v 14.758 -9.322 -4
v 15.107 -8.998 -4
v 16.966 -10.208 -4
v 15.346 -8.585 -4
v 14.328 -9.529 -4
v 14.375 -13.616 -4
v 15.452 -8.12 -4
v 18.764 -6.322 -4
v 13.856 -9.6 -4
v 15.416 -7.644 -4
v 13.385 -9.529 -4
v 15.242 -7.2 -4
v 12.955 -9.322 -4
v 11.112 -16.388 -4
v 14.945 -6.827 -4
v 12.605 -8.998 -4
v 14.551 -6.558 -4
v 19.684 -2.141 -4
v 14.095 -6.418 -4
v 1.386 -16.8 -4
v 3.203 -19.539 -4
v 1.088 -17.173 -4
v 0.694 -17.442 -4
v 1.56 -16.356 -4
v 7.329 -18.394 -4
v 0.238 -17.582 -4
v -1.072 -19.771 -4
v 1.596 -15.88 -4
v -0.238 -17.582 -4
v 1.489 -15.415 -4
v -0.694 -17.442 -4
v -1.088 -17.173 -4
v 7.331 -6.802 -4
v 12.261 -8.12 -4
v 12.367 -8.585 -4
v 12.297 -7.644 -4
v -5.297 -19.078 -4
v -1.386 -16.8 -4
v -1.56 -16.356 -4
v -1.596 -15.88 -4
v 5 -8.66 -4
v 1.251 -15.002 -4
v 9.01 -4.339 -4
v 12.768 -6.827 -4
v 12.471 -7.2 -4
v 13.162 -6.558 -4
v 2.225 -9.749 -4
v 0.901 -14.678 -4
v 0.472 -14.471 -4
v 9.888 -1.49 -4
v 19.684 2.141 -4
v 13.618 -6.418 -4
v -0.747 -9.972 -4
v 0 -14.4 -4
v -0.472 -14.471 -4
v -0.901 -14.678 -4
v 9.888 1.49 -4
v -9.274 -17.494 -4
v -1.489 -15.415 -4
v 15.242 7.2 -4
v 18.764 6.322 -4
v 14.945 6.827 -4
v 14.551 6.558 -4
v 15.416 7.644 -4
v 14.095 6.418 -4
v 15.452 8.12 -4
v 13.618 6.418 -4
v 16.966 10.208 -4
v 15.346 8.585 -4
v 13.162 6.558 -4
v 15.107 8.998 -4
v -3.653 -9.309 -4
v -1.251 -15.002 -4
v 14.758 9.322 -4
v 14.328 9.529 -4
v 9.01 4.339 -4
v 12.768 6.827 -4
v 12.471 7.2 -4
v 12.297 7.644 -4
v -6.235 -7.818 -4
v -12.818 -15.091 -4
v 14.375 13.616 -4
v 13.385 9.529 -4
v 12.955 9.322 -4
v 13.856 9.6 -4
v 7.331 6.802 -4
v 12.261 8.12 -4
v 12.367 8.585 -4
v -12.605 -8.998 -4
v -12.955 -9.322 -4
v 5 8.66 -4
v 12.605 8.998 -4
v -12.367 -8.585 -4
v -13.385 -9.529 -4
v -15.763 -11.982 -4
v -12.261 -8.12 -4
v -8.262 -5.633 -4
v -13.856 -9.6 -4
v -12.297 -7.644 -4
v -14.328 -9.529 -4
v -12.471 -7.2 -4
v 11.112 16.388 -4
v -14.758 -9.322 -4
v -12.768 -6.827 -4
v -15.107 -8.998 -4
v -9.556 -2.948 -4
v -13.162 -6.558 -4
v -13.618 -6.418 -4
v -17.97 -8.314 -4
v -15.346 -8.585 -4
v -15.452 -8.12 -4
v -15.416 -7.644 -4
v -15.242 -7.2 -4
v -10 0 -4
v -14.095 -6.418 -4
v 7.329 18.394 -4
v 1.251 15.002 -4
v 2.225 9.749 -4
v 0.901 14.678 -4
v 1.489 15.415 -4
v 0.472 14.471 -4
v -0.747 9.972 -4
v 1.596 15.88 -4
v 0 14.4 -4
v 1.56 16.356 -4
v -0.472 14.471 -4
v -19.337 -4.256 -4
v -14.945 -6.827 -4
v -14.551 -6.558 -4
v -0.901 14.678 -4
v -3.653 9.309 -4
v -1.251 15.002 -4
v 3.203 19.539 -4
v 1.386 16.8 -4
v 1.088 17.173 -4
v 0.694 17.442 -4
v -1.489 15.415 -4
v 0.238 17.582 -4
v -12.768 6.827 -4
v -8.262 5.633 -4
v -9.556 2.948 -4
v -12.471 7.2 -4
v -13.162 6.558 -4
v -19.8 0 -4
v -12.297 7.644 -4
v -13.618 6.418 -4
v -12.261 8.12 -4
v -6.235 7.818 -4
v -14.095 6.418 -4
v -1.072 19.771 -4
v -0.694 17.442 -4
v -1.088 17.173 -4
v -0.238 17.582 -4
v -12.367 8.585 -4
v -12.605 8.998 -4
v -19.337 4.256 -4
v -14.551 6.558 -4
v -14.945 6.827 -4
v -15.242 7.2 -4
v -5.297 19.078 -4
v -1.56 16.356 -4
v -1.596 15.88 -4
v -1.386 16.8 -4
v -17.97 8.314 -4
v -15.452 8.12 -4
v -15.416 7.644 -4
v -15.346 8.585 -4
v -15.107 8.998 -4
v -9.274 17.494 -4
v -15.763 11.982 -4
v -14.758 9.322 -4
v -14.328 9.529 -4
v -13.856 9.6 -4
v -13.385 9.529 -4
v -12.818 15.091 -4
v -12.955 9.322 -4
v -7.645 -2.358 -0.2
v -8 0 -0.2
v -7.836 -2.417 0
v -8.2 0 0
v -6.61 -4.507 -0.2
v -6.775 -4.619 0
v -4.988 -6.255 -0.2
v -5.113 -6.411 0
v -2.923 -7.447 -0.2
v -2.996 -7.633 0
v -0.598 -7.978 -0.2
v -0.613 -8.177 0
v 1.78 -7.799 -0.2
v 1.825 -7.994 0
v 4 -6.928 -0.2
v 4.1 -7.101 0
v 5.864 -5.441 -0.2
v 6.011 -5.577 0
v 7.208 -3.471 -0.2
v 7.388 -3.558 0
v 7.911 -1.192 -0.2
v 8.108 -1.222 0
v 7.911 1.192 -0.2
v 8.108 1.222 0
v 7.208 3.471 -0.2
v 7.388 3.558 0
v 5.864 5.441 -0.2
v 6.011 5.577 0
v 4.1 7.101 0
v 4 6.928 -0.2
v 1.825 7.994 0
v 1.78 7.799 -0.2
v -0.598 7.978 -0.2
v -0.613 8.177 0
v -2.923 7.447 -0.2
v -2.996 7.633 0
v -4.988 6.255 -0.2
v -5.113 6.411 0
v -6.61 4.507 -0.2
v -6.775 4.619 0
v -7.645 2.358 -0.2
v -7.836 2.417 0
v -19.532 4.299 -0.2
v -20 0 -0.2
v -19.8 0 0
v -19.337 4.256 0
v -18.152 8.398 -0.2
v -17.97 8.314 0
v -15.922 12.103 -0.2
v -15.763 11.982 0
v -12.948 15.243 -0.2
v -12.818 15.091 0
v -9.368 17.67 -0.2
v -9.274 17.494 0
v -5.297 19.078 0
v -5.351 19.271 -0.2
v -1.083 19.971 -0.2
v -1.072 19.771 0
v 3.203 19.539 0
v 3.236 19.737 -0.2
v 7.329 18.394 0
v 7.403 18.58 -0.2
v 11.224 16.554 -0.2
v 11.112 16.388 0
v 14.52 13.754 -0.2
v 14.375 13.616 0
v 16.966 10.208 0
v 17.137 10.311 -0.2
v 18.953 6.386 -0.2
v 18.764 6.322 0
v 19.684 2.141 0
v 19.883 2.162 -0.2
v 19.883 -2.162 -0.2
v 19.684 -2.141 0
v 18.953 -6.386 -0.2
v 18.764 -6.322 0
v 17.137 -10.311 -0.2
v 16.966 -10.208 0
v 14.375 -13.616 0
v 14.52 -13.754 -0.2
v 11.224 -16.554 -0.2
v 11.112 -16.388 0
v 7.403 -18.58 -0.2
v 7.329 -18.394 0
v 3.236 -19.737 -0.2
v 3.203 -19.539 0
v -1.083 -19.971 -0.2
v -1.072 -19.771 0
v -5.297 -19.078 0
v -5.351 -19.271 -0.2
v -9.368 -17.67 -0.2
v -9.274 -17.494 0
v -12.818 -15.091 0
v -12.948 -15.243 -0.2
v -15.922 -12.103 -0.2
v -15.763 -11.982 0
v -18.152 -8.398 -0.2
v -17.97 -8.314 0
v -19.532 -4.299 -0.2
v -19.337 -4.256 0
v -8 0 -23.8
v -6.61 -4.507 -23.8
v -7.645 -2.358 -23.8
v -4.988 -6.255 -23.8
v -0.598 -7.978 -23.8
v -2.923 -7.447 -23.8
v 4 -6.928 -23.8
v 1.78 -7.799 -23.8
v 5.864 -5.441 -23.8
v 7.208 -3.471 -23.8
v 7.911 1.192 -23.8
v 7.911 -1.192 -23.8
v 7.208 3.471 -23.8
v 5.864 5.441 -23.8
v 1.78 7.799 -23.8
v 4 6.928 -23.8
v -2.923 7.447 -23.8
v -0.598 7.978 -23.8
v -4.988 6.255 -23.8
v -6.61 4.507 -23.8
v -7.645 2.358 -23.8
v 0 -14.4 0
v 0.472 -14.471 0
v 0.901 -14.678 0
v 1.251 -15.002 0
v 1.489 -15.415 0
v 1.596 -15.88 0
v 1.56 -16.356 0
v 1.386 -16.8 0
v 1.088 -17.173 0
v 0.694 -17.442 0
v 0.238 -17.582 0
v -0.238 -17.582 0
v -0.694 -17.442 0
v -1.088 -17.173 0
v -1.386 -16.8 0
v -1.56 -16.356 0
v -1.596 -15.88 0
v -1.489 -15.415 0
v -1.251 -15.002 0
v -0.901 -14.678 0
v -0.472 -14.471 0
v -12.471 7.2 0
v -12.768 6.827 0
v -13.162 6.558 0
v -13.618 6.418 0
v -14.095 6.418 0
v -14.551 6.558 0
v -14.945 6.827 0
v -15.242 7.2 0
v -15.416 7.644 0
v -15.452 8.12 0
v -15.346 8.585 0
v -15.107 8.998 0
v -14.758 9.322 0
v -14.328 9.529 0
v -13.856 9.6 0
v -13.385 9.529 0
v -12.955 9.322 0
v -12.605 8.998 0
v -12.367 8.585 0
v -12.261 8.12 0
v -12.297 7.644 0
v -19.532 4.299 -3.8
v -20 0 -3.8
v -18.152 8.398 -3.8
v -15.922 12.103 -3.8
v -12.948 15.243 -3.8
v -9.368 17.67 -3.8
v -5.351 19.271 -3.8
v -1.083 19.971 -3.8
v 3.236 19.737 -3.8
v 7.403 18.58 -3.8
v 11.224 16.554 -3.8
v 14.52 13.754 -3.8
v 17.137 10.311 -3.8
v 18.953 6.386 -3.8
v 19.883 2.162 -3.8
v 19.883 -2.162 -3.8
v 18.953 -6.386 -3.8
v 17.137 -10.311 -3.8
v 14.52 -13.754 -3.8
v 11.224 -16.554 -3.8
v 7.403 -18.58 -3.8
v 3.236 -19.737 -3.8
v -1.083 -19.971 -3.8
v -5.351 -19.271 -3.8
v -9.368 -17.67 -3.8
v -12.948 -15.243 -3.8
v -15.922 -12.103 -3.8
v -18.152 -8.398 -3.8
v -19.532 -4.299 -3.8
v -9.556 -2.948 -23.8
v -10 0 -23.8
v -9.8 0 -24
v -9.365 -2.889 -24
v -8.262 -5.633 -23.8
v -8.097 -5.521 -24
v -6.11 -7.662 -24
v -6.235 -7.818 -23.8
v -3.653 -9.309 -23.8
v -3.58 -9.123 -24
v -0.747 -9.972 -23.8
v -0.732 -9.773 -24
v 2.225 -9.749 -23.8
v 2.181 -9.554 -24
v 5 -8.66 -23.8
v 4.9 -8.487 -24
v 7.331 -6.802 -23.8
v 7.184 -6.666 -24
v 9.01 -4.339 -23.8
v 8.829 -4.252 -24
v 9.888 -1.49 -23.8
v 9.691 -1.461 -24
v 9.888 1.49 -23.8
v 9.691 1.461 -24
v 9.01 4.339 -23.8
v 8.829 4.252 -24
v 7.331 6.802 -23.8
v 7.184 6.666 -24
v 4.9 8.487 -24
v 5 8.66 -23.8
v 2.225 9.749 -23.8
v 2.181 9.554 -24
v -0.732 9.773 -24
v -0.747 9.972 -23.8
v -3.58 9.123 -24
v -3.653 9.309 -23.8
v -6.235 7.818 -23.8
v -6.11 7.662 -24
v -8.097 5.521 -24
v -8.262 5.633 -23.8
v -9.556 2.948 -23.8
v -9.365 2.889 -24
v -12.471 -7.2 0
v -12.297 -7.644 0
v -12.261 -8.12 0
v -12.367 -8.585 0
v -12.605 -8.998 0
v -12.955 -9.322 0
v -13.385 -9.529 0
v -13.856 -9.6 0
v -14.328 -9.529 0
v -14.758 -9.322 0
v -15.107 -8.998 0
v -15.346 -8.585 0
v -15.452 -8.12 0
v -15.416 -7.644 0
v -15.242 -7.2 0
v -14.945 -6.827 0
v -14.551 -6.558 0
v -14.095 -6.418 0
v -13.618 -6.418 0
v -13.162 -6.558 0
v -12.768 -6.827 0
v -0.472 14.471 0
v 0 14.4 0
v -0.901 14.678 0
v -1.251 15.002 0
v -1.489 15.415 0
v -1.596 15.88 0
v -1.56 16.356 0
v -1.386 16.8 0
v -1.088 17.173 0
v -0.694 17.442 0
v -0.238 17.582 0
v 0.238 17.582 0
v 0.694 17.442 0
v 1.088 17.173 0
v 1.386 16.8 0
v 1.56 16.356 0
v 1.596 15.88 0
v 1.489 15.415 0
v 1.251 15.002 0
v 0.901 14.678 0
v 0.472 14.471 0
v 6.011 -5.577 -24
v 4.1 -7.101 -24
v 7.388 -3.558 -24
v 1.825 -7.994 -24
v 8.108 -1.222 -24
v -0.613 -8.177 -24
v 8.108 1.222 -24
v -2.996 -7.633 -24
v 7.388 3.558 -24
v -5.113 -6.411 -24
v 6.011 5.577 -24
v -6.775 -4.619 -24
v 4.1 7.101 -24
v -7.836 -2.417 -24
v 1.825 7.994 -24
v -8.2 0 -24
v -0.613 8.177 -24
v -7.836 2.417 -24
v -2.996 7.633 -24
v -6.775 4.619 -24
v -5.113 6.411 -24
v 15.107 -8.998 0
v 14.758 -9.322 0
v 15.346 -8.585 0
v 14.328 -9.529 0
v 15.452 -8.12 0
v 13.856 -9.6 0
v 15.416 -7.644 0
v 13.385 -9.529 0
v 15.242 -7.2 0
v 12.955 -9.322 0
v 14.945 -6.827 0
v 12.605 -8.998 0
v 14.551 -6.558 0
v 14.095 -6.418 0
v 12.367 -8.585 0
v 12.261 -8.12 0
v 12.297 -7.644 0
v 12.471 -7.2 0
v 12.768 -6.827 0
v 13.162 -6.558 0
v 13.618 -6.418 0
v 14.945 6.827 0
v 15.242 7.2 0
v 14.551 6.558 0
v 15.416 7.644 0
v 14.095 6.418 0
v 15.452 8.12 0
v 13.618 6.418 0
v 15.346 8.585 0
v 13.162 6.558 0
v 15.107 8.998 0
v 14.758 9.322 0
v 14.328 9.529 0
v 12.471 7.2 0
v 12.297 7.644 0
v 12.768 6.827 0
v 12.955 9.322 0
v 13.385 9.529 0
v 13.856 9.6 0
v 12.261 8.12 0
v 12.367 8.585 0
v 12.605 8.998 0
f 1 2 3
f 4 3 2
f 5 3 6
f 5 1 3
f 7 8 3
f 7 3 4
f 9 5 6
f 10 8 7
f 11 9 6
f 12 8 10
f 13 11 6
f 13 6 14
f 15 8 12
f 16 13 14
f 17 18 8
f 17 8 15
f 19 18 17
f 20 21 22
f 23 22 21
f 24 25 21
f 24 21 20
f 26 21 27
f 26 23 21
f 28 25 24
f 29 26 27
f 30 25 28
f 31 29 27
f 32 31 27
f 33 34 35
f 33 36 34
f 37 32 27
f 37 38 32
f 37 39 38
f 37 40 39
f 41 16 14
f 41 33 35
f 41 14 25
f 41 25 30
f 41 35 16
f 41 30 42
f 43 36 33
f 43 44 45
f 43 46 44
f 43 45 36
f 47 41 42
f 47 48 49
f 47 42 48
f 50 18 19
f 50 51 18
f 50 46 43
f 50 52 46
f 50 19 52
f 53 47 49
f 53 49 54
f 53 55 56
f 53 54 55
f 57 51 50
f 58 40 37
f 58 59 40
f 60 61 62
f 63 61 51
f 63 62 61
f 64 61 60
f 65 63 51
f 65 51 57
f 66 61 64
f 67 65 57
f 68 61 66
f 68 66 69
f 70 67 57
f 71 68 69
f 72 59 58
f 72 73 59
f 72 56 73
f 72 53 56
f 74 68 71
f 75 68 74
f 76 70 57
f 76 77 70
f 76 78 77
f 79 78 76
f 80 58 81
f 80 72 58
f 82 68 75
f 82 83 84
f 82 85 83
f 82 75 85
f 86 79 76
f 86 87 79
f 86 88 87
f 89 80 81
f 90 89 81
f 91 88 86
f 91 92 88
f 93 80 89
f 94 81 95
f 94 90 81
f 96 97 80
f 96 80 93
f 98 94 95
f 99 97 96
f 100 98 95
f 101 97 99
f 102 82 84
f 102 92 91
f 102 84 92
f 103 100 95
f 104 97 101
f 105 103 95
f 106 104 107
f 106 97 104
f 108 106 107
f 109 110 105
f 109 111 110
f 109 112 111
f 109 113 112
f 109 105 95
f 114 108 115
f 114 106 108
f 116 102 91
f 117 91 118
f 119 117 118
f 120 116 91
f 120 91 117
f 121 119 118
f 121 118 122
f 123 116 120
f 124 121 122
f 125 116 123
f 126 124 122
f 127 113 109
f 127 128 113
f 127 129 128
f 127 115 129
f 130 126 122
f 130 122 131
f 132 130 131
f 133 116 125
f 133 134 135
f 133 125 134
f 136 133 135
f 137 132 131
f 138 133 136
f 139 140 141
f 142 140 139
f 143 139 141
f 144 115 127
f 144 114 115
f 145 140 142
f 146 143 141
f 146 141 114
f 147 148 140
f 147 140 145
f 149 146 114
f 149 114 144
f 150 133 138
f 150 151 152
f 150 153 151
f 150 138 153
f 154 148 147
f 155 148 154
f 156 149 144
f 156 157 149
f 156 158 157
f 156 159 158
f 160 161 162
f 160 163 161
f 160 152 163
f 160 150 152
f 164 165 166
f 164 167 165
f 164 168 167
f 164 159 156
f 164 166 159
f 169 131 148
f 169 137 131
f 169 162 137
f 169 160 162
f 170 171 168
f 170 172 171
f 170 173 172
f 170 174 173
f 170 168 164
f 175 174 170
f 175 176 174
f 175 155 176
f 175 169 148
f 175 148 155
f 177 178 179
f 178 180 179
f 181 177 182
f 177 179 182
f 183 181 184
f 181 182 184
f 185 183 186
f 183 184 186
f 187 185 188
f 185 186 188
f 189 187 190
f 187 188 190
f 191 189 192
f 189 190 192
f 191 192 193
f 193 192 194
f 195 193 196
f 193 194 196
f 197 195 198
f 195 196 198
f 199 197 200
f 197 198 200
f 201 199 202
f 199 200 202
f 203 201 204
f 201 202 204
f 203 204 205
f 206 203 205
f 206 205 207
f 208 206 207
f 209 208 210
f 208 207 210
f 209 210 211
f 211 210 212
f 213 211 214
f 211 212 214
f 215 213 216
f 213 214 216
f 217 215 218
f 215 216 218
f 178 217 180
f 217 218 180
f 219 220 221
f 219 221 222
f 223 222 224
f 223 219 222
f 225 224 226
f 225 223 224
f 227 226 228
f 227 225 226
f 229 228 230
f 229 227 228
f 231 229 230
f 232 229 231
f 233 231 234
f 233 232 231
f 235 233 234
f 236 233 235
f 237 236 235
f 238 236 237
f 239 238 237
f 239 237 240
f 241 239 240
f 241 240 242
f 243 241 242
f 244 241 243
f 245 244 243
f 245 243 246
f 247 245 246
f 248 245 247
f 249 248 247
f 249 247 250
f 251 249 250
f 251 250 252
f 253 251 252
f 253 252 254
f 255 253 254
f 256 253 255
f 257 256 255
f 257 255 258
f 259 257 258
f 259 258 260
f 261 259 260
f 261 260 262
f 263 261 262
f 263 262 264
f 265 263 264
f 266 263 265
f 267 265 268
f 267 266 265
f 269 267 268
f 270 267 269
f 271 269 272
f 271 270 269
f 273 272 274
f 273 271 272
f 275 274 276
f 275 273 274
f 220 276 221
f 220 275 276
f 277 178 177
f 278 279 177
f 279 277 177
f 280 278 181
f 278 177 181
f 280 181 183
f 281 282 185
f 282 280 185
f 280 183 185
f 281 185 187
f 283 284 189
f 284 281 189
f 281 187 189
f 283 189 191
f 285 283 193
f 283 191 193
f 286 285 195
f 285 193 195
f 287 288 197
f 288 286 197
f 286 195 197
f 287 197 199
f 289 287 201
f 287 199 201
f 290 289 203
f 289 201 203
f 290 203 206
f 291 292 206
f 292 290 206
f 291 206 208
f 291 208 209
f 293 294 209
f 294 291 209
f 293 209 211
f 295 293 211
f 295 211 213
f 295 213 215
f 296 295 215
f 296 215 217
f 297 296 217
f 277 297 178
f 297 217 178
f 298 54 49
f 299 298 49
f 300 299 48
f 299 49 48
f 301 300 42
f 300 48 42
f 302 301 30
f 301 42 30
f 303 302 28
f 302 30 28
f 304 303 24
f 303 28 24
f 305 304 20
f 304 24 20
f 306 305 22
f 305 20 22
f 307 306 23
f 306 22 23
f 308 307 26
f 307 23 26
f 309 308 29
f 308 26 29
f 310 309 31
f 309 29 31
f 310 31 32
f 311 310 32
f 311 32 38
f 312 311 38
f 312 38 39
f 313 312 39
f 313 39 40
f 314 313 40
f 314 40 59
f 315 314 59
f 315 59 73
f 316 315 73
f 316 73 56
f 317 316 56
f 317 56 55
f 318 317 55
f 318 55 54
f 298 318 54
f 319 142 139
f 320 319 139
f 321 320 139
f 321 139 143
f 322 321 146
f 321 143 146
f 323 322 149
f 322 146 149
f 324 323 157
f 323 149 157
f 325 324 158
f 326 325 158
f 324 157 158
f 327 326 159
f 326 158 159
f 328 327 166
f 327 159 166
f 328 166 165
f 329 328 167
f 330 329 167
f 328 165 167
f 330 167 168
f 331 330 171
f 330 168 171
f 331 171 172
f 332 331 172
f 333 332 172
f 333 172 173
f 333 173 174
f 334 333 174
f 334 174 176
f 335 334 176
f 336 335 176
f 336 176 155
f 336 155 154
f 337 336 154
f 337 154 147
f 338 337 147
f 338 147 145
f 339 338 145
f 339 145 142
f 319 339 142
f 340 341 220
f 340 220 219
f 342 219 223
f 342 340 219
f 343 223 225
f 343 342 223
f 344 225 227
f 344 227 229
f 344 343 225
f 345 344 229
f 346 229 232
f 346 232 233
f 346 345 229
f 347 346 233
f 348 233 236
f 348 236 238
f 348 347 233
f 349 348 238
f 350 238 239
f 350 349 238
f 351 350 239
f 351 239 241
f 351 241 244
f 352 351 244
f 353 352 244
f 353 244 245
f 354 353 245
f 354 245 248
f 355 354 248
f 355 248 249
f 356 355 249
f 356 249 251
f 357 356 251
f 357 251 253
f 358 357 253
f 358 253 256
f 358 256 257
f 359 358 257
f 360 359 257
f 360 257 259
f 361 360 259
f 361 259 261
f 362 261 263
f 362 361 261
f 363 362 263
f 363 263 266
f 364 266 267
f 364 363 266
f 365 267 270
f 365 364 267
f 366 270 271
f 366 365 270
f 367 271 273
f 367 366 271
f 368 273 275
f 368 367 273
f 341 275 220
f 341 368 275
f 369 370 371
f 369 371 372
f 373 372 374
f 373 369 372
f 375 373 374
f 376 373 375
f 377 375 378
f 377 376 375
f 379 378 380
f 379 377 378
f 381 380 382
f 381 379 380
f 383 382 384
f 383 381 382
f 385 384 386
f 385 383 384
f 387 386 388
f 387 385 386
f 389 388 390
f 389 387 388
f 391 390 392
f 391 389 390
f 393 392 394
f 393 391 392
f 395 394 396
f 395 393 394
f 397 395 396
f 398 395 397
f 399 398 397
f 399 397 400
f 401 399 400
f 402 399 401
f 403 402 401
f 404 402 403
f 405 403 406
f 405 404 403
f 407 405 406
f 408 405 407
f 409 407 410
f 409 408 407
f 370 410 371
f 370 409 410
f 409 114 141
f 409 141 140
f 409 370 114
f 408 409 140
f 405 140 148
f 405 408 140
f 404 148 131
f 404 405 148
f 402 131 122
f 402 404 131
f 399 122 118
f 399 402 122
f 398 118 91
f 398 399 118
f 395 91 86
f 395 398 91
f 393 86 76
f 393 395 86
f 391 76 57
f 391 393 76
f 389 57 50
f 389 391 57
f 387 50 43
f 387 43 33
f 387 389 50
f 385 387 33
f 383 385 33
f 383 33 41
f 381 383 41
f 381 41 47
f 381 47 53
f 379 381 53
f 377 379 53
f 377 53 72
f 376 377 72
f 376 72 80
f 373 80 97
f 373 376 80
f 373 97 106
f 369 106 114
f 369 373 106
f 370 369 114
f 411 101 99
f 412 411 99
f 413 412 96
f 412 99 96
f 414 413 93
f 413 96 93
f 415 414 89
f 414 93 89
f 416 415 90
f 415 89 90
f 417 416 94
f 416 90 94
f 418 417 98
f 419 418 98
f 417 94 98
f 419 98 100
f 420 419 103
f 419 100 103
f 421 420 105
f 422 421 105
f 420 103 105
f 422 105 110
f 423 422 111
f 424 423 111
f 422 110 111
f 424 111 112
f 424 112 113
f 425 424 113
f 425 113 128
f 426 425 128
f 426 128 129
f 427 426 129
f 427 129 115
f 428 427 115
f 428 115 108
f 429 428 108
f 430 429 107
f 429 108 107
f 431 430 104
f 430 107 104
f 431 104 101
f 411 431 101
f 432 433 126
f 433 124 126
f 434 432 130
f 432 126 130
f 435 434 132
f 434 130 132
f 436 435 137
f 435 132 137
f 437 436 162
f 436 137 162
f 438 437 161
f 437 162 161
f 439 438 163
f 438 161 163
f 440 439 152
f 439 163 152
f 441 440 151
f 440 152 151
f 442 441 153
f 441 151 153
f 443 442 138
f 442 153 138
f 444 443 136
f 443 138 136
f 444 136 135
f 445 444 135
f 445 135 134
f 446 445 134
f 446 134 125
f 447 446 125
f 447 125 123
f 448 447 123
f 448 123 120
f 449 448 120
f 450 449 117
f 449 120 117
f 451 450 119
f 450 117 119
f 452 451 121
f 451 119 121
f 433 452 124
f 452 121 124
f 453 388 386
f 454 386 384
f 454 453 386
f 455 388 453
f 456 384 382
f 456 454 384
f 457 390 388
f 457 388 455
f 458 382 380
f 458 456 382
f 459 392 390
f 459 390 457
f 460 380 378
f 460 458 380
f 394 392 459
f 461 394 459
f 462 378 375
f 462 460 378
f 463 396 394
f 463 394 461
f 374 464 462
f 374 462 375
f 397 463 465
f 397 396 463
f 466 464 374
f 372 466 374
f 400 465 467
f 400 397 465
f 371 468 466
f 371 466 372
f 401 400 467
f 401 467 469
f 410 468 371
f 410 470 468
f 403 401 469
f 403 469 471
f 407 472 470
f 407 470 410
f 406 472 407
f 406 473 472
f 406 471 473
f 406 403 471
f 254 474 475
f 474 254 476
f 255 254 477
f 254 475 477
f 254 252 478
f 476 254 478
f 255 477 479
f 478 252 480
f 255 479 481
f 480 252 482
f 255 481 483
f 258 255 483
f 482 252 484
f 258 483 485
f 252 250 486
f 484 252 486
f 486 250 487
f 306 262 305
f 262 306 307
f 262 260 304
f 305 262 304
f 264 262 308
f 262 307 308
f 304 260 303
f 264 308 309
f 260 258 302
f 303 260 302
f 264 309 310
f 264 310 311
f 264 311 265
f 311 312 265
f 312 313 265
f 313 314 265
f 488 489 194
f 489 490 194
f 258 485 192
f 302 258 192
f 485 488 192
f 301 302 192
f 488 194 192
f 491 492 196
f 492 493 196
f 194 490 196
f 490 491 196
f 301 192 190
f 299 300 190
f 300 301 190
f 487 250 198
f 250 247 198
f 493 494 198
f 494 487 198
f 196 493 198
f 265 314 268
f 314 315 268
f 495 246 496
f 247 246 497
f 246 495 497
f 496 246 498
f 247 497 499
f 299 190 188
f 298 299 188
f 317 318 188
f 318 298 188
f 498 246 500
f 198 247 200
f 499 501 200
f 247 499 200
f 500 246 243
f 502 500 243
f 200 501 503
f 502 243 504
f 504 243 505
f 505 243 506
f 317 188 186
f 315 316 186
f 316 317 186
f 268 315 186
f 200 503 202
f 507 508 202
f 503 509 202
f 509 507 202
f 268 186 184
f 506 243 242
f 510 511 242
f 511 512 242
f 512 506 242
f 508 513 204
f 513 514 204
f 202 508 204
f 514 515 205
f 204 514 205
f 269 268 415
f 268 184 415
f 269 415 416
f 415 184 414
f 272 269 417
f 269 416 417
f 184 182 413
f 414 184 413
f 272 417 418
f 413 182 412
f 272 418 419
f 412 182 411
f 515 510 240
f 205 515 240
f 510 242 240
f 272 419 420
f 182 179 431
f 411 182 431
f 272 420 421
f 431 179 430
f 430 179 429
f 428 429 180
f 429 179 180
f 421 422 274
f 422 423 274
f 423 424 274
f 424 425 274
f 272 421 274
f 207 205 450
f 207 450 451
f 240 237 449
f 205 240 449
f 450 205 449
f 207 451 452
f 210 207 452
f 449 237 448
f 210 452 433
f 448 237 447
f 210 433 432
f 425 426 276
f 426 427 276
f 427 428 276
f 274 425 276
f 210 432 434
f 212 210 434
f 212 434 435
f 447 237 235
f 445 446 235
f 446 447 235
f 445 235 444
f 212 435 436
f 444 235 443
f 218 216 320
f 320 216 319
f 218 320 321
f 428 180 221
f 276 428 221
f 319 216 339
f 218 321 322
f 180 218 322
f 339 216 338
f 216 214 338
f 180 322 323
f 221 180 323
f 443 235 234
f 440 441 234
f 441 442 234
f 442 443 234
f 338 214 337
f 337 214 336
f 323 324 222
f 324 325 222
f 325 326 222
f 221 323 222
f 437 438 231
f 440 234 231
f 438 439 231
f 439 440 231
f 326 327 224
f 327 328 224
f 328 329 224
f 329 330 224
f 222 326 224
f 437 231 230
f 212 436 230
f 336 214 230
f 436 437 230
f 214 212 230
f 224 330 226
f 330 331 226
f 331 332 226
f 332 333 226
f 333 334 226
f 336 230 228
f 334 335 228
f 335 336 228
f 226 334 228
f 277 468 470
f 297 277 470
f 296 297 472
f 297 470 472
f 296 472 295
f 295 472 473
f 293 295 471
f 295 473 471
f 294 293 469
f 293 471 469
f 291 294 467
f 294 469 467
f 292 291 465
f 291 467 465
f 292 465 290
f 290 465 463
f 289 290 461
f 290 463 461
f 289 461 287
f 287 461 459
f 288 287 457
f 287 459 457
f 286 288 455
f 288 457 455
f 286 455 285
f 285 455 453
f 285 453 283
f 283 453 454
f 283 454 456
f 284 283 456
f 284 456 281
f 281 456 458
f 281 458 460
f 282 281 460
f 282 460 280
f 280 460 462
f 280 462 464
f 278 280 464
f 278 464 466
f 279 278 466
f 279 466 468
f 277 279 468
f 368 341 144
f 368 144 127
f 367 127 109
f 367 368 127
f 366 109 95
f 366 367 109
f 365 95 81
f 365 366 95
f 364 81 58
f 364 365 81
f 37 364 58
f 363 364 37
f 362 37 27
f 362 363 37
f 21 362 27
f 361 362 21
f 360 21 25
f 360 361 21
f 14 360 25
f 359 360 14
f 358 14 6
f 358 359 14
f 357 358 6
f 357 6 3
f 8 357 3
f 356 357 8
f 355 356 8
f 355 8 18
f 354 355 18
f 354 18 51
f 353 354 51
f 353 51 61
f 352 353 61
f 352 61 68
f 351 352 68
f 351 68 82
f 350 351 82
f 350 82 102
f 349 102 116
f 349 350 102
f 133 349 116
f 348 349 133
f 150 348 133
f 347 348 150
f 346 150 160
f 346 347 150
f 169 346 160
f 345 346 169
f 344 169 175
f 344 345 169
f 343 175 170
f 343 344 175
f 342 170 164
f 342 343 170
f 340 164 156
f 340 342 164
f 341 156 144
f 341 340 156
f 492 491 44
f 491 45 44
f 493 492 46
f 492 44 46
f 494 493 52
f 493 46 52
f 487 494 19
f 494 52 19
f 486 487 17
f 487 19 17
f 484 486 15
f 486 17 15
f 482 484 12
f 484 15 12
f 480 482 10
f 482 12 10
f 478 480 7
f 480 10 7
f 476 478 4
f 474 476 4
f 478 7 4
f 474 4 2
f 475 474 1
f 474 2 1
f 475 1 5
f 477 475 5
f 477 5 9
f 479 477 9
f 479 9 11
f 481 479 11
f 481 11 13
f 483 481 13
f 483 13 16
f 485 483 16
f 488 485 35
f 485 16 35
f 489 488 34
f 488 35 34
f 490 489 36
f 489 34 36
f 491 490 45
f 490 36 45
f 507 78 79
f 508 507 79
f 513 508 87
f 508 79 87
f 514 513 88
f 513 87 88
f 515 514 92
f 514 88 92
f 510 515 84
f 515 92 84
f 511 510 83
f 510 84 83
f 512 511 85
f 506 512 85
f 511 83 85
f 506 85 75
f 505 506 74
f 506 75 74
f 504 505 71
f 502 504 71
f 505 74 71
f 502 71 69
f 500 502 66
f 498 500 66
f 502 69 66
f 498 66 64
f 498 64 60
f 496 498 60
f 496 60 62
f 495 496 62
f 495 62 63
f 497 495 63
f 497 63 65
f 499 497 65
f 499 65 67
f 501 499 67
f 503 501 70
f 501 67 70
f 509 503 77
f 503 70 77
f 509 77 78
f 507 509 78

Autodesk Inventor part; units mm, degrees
ref_plane "YZ Plane" through (0, 0, 0) normal (1, 0, 0) x (0, 1, 0)
ref_plane "XZ Plane" through (0, 0, 0) normal (0, 1, 0) x (-1, 0, 0)
ref_plane "XY Plane" through (0, 0, 0) normal (0, 0, 1) x (1, 0, 0)
sketch "Sketch1" plane through (0, 0, 0) normal (0, 1, 0) x (-1, 0, 0)
  line L0 (8.2, 0) -> (19.8, 0)
  line L1 (20, -0.2) -> (20, -3.8)
  line L2 (19.8, -4) -> (10, -4)
  line L3 (10, -4) -> (10, -23.8)
  line L4 (8, -23.8) -> (8, -0.2)
  line L5 (0, 0) -> (0, -60.12)
  line L6 (9.8, -24) -> (8.2, -24)
  line L7 (20, -0.2) -> (19.8, 0)
  line L8 (20, -3.8) -> (19.8, -4)
  line L9 (8.2, 0) -> (8, -0.2)
  line L10 (8, -23.8) -> (8.2, -24)
  line L11 (9.8, -24) -> (10, -23.8)
  point P0 (8, 0)
  point P1 (20, 0)
  point P2 (20, -4)
  point P3 (10, -24)
  point P4 (8, -24)
  dimension "d0" = 40
  dimension "d1" = 4
  dimension "d2" = 20
  dimension "d6" = 10
  dimension "d7" = 2
  dimension "d8" = 20
  dimension "d9" = 16
  dimension "d10" = 0.2
  dimension "d11" = 0.2
  dimension "d12" = 0.2
  dimension "d13" = 0.2
  dimension "d14" = 0.2
  dimension "d15" = 0.2
  dimension "d16" = 0.2
  dimension "d17" = 0.2
  dimension "d18" = 0.2
  dimension "d19" = 0.2
revolve "Revolution1" add sketch "Sketch1" angle 360 about axis through (0, 0, 0) along (0, 0, -1)
sketch "Sketch2" plane through (0, 0, 0) normal (0, 0, 1) x (1, 0, 0)
  circle A0 centre (0, 0) radius 20 projected
  point P0 (0, 16)
  dimension "d21" = 16
hole "Hole1" at (0, 16, 0) direction (0, 0, -1) diameter 3.2 end through all
pattern_circular "Circular Pattern1" count 6 over 360 about axis through (0, 0, -2) along (0, 0, -1) of "Hole1"
equation "\"d11\" = d10"
equation "\"d12\" = d10"
equation "\"d13\" = d12"
equation "\"d14\" = d10"
equation "\"d15\" = d14"
equation "\"d16\" = d10"
equation "\"d17\" = d16"
equation "\"d18\" = d10"
equation "\"d19\" = d18"
properties part number "TungstenFlange" material "Aluminum 6061"
